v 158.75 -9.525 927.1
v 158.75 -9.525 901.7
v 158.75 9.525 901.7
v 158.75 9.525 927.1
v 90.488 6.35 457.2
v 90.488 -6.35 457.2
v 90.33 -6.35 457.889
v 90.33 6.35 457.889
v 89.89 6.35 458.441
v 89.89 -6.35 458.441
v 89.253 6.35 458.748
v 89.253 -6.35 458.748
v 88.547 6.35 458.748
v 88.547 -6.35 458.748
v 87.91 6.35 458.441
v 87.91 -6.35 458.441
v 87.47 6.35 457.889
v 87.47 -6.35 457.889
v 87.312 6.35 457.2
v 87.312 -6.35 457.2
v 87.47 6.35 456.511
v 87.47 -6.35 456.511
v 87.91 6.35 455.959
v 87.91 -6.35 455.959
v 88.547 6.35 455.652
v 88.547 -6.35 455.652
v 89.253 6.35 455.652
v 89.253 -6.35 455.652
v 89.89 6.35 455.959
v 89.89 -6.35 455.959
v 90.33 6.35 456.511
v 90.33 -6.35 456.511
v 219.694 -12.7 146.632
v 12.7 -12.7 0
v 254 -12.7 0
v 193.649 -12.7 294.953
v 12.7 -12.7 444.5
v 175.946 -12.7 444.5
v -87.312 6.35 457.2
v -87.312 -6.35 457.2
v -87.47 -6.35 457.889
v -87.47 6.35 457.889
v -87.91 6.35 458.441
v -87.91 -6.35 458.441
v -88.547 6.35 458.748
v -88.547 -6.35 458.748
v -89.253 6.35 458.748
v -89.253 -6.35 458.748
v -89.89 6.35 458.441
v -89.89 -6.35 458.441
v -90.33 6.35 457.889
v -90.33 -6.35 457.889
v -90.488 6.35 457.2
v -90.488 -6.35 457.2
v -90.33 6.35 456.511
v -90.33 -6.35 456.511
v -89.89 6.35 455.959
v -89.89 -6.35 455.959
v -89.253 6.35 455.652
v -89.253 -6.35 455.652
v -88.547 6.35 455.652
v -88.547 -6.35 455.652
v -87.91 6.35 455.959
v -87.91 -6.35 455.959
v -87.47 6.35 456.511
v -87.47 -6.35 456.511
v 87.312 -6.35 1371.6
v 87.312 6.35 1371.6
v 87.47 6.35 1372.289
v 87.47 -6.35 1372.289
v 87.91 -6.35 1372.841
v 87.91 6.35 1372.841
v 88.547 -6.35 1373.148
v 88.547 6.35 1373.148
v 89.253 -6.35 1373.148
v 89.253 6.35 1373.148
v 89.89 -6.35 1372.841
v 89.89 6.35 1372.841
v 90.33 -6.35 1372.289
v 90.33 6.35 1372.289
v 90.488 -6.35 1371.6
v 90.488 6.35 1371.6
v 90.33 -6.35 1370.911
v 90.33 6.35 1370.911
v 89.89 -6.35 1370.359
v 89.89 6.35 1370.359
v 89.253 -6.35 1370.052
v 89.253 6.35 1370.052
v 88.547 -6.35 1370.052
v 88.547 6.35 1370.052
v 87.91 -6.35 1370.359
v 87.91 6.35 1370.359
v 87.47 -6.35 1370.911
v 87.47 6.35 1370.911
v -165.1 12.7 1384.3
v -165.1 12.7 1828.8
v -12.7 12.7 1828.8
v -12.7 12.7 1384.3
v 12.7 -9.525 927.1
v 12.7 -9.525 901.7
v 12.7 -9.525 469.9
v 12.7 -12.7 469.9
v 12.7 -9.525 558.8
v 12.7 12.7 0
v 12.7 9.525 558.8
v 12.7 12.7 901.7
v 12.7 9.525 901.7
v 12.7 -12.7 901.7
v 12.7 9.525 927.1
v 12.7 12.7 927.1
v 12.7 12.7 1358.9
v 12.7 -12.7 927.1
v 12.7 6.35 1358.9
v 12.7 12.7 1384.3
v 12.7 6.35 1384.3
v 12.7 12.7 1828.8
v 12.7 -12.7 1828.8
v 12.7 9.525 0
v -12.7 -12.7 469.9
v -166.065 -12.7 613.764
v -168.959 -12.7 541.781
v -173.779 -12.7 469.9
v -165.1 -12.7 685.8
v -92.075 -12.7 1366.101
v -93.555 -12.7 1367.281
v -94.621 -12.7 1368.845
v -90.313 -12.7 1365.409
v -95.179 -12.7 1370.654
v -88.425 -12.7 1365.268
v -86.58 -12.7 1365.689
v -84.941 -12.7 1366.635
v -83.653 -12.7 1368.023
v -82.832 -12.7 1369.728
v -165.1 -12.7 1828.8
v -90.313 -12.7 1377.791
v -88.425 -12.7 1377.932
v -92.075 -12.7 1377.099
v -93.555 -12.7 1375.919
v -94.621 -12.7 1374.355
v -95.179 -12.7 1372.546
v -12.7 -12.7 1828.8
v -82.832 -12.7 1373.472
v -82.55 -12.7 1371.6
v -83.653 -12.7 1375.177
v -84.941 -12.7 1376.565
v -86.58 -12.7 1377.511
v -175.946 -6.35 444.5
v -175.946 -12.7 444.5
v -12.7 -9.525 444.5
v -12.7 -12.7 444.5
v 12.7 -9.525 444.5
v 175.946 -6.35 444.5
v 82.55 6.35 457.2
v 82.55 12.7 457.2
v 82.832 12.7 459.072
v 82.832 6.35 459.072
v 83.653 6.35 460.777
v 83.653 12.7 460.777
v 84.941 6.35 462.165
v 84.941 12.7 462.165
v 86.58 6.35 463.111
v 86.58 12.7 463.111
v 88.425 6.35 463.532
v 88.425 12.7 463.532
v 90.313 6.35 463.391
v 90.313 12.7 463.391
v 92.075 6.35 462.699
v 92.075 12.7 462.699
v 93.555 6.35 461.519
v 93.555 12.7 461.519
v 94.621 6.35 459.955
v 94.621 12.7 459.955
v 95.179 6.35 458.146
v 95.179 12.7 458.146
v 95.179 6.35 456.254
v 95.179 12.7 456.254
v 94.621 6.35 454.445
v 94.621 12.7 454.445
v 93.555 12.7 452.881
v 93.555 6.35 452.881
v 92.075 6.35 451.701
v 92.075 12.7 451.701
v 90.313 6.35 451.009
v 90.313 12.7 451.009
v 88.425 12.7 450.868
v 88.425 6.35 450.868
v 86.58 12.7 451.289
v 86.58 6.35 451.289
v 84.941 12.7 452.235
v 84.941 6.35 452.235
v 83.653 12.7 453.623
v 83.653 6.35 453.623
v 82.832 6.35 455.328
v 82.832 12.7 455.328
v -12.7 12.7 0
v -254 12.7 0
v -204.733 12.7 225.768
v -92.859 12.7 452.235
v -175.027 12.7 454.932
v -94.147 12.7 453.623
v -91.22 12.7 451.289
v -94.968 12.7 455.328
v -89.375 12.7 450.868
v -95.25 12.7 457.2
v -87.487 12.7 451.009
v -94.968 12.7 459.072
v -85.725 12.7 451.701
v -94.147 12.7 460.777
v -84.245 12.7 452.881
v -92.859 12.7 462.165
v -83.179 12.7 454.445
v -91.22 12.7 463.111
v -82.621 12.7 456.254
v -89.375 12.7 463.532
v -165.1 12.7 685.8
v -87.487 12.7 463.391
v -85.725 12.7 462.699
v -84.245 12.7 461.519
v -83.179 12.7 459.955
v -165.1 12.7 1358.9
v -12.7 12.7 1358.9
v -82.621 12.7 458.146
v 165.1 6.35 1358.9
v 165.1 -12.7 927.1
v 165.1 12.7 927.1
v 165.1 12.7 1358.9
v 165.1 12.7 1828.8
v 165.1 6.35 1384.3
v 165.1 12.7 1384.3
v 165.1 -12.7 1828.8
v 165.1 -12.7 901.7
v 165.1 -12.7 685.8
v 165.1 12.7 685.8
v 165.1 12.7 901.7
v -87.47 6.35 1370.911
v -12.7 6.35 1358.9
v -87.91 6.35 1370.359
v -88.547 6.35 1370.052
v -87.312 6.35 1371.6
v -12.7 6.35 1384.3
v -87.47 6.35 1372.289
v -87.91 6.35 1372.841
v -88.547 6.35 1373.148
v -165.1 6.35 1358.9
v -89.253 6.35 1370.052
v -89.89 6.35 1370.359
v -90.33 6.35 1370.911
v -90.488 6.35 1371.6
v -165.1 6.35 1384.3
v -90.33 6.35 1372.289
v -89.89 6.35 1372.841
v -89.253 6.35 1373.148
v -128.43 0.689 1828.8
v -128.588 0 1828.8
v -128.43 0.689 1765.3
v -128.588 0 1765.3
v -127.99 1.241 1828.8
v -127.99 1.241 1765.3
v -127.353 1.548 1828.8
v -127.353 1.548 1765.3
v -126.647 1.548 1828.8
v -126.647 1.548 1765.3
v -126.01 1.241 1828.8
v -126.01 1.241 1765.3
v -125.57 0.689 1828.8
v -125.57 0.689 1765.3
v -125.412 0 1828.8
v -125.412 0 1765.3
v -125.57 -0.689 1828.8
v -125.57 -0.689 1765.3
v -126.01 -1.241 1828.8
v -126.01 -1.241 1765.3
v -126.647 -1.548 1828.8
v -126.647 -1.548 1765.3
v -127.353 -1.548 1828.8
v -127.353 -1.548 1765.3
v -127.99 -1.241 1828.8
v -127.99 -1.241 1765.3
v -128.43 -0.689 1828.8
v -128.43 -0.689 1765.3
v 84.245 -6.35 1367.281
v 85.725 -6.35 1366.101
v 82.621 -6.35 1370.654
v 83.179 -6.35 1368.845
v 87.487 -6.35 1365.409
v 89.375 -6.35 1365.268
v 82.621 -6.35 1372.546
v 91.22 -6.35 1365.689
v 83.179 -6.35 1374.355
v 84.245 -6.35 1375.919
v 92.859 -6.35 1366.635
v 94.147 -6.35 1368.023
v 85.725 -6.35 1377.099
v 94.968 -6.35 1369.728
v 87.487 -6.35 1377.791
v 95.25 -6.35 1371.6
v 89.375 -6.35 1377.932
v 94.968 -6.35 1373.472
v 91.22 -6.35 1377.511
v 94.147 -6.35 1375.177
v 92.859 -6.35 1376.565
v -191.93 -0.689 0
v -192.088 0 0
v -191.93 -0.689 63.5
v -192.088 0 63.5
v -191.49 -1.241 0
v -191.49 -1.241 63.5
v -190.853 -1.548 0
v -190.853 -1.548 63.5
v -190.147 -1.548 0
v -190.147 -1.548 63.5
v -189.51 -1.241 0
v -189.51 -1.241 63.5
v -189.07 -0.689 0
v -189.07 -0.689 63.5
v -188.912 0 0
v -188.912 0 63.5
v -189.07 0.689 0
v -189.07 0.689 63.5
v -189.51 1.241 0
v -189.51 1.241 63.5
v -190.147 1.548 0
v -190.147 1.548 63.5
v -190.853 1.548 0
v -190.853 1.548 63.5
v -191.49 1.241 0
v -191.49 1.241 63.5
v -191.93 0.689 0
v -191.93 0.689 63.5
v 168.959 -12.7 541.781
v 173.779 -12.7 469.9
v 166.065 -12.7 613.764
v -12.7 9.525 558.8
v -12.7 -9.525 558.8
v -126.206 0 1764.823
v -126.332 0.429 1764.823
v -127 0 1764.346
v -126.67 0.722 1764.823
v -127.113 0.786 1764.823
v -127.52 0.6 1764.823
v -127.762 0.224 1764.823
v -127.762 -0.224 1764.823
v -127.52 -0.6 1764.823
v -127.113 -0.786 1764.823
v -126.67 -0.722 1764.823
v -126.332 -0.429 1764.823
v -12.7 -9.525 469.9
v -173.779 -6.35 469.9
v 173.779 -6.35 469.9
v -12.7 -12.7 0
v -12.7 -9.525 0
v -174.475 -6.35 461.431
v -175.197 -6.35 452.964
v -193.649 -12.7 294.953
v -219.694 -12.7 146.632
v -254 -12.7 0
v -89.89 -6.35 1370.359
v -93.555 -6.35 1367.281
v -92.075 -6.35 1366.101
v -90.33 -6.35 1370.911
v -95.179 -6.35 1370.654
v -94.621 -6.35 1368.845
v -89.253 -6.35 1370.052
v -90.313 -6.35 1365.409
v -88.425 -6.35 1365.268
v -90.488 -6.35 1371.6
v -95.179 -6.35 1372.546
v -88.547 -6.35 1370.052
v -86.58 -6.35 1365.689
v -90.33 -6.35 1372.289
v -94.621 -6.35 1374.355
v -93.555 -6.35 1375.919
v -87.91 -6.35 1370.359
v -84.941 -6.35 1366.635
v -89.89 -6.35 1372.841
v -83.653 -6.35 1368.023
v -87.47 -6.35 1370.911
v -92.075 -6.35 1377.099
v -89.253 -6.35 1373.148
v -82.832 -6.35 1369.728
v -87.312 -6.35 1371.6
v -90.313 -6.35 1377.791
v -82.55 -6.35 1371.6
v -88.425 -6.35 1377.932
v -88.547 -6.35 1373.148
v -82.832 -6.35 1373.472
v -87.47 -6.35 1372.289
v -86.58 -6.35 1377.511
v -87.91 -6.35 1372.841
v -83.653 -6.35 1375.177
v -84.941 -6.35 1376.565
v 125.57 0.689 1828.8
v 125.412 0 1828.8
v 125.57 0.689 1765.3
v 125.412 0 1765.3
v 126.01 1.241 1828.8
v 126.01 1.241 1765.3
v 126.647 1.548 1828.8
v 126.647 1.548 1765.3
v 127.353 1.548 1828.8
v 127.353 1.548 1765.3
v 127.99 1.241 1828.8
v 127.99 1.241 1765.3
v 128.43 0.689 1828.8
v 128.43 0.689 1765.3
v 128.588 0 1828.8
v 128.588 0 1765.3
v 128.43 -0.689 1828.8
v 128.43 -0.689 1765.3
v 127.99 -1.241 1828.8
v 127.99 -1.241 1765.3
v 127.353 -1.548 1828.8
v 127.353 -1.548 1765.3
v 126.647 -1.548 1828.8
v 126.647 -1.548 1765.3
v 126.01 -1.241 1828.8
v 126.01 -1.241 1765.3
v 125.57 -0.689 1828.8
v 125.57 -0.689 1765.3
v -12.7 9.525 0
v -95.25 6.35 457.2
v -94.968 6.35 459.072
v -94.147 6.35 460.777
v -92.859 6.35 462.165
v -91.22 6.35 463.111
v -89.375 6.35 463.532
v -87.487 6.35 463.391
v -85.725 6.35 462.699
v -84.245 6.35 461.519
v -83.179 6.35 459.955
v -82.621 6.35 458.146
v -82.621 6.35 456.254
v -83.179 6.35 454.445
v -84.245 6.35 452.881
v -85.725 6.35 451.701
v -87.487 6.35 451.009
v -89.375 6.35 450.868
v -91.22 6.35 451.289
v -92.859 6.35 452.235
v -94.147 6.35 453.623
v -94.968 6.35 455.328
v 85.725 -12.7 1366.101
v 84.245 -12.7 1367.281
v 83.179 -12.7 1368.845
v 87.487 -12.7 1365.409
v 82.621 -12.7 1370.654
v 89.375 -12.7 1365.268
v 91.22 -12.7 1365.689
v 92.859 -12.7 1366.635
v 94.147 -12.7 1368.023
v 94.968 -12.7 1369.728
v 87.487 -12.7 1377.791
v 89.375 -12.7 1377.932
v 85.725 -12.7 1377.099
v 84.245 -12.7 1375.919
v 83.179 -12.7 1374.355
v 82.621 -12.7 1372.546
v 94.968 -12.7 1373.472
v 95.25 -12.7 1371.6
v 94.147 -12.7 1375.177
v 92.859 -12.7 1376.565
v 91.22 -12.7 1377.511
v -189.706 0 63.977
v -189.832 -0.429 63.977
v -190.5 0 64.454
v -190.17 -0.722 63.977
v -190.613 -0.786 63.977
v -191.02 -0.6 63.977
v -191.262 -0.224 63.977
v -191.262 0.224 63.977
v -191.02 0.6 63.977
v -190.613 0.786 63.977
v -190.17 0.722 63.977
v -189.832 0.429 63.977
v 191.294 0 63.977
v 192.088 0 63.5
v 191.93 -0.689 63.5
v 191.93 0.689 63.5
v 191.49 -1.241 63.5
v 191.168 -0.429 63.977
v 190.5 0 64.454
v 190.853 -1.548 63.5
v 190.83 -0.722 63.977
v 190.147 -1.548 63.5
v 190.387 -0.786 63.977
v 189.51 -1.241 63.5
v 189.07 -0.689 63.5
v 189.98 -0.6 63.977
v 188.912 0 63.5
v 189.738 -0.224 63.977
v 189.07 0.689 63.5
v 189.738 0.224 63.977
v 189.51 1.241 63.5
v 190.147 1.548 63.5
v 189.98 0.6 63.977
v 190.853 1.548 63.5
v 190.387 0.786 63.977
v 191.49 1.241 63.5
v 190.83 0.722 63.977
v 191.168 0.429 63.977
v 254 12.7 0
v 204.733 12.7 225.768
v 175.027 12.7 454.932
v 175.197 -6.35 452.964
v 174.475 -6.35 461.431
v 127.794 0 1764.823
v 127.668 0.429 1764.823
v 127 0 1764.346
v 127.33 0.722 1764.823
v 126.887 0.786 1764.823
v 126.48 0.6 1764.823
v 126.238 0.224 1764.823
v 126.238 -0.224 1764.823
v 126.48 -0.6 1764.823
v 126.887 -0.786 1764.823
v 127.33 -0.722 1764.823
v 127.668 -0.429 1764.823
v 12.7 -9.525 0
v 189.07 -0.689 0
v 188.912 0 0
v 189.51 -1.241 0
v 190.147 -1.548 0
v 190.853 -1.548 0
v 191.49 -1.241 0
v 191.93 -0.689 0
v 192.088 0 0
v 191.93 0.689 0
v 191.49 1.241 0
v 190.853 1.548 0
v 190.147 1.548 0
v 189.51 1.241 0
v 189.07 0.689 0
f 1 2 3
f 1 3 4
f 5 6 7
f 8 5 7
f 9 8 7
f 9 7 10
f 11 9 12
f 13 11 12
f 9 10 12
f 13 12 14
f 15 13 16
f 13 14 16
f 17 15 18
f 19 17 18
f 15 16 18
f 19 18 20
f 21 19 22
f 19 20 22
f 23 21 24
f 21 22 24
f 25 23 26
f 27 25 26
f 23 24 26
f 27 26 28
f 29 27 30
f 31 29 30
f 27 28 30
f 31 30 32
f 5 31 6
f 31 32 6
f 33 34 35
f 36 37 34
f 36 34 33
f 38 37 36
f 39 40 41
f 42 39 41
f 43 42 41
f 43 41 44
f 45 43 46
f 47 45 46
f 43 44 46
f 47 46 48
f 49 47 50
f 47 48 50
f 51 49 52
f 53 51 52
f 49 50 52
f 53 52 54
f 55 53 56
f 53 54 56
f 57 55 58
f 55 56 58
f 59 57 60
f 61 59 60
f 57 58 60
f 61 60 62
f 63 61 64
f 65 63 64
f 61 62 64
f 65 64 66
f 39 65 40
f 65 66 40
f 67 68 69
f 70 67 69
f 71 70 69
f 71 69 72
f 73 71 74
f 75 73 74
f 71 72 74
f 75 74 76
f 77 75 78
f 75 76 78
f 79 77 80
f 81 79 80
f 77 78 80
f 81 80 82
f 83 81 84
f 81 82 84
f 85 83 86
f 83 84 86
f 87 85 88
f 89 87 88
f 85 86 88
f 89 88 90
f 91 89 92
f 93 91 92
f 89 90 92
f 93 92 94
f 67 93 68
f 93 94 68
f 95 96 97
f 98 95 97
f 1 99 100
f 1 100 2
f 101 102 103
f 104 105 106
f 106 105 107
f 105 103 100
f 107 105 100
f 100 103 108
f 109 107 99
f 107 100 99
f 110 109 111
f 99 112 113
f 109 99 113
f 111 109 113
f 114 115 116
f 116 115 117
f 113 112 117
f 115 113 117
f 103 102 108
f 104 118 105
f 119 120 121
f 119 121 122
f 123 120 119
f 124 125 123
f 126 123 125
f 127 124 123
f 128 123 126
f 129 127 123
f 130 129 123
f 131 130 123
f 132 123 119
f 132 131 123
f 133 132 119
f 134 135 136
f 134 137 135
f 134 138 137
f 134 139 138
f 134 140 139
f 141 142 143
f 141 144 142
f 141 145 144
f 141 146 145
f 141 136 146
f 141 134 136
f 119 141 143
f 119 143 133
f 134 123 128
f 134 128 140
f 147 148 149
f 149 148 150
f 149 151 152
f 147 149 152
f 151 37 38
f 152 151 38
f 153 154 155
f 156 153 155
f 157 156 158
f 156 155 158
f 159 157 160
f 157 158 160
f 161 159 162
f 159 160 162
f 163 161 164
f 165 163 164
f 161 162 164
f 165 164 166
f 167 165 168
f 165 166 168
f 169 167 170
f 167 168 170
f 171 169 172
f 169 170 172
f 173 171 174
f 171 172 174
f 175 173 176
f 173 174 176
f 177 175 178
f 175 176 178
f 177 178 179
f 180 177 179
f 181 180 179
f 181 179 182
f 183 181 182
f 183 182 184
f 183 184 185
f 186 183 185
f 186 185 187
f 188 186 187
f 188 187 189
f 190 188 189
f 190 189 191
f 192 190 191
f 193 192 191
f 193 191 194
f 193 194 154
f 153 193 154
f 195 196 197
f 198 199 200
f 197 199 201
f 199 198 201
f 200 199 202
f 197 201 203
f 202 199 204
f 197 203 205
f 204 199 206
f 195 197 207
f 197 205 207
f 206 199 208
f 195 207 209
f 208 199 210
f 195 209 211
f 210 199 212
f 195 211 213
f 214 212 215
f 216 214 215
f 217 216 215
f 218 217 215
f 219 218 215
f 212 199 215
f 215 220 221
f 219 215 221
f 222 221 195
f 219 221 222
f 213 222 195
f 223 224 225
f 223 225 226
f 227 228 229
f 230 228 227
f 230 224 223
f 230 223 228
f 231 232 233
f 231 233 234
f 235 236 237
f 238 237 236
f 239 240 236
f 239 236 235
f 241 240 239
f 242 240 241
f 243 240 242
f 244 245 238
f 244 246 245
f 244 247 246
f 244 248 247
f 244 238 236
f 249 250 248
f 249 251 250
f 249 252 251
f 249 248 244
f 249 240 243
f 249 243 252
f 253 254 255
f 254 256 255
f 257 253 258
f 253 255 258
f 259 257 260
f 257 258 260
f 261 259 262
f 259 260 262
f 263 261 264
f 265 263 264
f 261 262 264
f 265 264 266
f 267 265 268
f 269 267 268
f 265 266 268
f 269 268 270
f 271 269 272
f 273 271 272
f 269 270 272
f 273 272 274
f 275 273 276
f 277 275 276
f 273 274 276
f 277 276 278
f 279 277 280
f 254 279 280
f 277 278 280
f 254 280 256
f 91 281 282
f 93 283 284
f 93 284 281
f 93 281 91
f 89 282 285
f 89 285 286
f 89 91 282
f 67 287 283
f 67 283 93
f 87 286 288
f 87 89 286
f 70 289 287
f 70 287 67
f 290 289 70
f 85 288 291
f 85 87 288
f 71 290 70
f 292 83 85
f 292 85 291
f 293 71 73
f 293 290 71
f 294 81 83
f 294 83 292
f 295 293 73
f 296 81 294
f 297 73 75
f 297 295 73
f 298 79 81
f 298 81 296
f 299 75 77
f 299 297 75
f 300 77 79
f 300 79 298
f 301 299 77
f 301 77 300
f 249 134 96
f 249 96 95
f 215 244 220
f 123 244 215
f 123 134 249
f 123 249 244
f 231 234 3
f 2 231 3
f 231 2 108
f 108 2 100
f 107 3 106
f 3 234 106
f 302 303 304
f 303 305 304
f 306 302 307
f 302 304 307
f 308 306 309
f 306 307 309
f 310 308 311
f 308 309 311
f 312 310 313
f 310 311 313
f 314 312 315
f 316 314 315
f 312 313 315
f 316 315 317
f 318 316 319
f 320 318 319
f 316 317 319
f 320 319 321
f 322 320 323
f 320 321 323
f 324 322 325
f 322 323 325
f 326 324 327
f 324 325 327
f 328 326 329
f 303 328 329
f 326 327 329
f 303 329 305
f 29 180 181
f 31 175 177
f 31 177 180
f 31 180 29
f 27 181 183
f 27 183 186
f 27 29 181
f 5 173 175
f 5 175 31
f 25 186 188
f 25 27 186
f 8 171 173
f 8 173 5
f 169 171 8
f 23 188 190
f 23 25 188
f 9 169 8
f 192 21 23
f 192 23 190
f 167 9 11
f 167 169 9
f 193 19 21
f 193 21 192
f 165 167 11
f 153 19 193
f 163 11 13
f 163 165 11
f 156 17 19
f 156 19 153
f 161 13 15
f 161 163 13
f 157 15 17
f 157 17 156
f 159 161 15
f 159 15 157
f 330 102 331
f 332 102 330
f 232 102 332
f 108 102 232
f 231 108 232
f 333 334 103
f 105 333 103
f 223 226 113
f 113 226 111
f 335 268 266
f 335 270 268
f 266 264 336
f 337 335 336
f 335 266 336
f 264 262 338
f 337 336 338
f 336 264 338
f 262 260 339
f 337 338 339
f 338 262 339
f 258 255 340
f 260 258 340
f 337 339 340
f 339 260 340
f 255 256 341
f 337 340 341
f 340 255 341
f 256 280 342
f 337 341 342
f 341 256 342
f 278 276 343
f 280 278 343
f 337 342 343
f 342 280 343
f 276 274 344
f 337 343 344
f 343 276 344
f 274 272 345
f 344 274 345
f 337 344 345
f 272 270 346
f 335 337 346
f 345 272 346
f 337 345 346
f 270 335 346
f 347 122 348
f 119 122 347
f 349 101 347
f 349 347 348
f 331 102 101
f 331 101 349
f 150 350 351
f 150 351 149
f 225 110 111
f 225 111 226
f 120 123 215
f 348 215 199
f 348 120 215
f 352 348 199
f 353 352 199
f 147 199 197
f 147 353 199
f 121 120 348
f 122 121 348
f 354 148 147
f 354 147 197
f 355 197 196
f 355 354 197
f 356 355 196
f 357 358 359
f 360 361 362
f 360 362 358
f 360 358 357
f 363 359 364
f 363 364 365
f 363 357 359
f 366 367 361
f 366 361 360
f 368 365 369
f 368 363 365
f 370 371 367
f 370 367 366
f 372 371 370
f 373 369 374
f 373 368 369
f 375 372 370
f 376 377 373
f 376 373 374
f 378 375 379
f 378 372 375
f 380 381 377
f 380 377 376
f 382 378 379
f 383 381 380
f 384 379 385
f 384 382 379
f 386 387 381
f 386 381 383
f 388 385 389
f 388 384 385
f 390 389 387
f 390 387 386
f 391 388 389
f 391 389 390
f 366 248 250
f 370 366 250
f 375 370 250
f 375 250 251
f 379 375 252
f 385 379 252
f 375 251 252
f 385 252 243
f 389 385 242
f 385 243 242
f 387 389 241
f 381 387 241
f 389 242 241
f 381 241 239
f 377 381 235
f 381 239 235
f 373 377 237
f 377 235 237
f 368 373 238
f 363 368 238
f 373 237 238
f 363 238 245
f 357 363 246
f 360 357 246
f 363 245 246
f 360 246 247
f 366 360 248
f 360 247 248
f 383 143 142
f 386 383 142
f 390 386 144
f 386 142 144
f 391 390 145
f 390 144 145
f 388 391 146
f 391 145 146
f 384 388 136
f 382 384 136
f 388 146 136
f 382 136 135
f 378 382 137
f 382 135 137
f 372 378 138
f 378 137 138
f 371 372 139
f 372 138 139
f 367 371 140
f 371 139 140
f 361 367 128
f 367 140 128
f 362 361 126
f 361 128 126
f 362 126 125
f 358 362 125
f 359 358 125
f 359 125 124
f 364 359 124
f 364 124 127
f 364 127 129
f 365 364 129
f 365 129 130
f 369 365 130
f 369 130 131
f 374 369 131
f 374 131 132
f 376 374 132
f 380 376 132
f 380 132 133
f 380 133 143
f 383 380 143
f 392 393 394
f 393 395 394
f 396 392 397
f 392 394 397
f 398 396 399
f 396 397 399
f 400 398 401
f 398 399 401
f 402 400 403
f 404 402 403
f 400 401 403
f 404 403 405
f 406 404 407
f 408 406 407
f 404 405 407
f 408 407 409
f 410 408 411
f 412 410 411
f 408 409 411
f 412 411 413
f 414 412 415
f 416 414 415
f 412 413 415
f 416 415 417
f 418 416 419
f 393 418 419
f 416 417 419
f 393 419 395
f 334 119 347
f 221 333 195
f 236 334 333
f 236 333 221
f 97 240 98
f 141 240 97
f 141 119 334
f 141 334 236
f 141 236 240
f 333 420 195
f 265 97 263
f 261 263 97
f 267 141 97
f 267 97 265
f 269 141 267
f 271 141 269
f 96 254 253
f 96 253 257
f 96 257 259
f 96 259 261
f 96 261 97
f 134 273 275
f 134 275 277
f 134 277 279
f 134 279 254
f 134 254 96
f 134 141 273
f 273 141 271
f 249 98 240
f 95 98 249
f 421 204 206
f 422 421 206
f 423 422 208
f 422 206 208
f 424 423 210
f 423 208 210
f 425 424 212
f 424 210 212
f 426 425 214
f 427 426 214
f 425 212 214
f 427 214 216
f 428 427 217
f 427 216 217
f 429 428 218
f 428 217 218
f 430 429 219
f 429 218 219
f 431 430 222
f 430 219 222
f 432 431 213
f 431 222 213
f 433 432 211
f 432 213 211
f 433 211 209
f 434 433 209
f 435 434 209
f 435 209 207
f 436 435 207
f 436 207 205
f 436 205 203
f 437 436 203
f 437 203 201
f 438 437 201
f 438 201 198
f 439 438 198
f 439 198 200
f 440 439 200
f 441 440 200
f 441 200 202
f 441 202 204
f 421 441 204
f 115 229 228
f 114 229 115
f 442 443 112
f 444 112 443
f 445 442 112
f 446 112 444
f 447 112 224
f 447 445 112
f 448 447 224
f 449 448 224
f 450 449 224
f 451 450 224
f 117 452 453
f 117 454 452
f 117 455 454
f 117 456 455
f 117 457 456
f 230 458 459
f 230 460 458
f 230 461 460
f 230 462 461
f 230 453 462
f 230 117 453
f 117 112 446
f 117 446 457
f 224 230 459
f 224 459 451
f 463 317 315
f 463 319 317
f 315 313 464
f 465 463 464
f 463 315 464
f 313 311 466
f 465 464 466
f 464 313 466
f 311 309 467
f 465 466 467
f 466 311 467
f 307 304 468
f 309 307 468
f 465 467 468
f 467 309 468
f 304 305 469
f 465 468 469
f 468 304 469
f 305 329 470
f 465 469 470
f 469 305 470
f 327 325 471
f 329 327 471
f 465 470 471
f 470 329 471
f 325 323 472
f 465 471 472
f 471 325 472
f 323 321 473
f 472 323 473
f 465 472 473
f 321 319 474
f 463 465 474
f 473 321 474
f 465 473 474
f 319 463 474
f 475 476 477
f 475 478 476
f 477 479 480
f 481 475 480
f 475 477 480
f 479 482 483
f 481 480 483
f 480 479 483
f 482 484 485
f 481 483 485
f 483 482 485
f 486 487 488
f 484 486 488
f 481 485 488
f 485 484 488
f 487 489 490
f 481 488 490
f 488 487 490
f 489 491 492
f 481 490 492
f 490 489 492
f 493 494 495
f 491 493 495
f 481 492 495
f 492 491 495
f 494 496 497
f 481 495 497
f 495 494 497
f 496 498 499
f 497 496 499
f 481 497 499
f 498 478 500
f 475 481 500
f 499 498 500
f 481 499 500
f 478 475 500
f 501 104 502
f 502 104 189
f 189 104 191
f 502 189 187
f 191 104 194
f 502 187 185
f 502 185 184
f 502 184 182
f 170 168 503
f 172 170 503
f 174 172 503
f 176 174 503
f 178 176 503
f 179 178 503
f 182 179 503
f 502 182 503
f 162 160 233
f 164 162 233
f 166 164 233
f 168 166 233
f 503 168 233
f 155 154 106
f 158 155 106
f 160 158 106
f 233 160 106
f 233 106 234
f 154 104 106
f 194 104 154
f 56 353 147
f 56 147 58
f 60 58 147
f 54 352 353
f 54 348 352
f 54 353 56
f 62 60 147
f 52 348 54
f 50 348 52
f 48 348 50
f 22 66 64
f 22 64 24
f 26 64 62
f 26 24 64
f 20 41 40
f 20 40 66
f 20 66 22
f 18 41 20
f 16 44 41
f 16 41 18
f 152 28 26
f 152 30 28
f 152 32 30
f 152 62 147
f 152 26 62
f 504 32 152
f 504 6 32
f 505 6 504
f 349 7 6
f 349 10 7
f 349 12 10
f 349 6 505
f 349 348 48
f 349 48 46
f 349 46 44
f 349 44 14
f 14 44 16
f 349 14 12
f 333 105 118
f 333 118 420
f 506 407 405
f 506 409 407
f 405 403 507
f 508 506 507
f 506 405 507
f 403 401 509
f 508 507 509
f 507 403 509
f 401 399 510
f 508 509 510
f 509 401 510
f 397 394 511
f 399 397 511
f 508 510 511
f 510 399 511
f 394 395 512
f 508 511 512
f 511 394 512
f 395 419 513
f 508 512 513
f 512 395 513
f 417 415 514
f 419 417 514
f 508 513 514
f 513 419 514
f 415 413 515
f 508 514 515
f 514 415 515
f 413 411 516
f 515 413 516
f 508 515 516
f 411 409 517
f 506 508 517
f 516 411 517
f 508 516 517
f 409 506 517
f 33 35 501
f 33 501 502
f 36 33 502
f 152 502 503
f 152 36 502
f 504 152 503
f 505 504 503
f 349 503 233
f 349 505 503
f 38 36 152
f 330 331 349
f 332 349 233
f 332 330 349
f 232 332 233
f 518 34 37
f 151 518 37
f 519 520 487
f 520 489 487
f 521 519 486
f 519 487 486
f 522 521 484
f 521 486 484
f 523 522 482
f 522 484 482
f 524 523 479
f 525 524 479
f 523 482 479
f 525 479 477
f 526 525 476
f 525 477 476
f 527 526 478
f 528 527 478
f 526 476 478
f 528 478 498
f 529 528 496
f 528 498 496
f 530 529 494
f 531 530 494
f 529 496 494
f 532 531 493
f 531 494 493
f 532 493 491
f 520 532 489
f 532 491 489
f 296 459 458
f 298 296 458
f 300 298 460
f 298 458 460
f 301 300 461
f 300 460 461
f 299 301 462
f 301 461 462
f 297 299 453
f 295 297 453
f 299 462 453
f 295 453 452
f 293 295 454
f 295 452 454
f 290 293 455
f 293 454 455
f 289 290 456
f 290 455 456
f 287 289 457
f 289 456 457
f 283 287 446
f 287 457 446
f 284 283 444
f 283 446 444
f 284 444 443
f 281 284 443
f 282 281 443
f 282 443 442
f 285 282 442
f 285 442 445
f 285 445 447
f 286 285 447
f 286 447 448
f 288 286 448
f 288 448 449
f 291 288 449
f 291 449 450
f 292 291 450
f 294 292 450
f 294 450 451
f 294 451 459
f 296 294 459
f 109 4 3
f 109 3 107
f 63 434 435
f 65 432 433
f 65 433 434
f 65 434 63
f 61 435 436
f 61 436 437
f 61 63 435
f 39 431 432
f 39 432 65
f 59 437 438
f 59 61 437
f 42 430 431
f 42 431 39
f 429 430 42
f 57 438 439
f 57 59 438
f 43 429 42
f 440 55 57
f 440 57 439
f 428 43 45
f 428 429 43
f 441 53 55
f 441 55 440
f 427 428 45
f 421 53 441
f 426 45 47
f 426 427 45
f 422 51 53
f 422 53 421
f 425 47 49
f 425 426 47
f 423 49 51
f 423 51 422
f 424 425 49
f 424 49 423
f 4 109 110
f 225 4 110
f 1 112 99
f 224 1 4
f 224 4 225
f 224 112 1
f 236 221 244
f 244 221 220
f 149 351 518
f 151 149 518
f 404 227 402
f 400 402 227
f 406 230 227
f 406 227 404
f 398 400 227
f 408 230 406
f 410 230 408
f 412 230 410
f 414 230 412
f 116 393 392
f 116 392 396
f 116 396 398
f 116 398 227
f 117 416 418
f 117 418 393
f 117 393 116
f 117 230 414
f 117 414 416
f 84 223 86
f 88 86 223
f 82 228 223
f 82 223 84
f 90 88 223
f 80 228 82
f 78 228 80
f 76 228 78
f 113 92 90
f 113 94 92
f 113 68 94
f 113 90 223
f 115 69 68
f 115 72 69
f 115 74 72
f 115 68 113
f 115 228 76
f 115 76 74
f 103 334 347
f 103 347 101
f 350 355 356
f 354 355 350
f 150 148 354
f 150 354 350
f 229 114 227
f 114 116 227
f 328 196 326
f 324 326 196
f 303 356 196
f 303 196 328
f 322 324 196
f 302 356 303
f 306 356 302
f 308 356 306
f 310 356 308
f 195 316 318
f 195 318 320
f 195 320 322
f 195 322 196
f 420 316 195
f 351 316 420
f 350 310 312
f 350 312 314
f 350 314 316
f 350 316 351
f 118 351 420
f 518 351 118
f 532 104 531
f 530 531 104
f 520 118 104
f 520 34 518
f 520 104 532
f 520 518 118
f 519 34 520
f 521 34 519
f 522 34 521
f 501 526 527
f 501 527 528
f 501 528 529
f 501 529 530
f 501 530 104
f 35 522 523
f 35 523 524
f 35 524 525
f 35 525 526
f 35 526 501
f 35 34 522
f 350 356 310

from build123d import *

# Parameters (mm, degrees)
F1_DEPTH       = 12.7
F25_DEPTH      = 38.1
F3_D           = 3.175
F3_DEPTH       = 63.5
F3_CBORE_D     = 12.7
F3_CBORE_DEPTH = 6.35
F3_TIP         = 0.9538662327
F5_D           = 3.175
F5_DEPTH       = 63.5
F5_CBORE_D     = 12.7
F5_CBORE_DEPTH = 6.35
F5_TIP         = 0.9538662327
F7_D           = 3.175
F7_DEPTH       = 63.5
F7_TIP         = 0.9538662327
F9_D           = 3.175
F9_DEPTH       = 63.5
F9_TIP         = 0.9538662327
F10_W          = 330.2
F10_H          = 25.4
F11_DEPTH      = 6.35
F12_W          = 426.9362986088
F12_H          = 25.4
F13_DEPTH      = 6.35
F14_W          = 25.4
F14_H          = 558.8
F15_DEPTH      = 3.175
F16_W          = 25.4
F16_H          = 558.8
F17_DEPTH      = 3.175
F19_W          = 12.7
F19_H          = 25.4
F20_DEPTH      = 25.4
F18_W          = 165.1
F18_H          = 25.4
F21_DEPTH      = 3.175
F22_W          = 165.1
F22_H          = 25.4
F23_DEPTH      = 3.175


with BuildPart() as f1:
    # F0 (on Front) → F1 (new body, symmetric)
    with BuildSketch(Plane.XZ):
        with BuildLine():
            Line((165.1, 1828.8), (0, 1828.8))
            Line((0, 1828.8), (-165.1, 1828.8))
            Line((-165.1, 1828.8), (-165.1, 685.8))
            ThreePointArc((-165.1, 685.8), (-187.4175900274, 340.0309838924), (-254, 0))
            Line((-254, 0), (0, 0))
            Line((0, 0), (254, 0))
            ThreePointArc((254, 0), (187.4175900273, 340.0309838924), (165.1, 685.8))
            Line((165.1, 685.8), (165.1, 1828.8))
        make_face()
    extrude(amount=F1_DEPTH, both=True)

    # F24 (on face) → F25 (cut)
    with BuildSketch(Plane.XZ.offset(12.7)):
        Polygon((-12.7, 558.8), (0, 558.8), (12.7, 558.8), (12.7, 1828.8), (0, 1828.8), (-12.7, 1828.8), align=None)
    extrude(amount=-F25_DEPTH, mode=Mode.SUBTRACT)

    # F3
    with Locations(Plane.XZ.offset(12.7)):
        with Locations((-88.9, 1371.6), (88.9, 1371.6)):
            CounterBoreHole(F3_D / 2, F3_CBORE_D / 2, F3_CBORE_DEPTH, depth=F3_DEPTH)
            with Locations((0, 0, -(F3_DEPTH + F3_TIP / 2))):  # 118° drill point
                Cone(0, F3_D / 2, F3_TIP, mode=Mode.SUBTRACT)

    # F5
    with Locations(Plane(origin=(0, 12.7, 0), x_dir=(-1, 0, 0), z_dir=(0, 1, 0))):
        with Locations((-88.9, 457.2), (88.9, 457.2)):
            CounterBoreHole(F5_D / 2, F5_CBORE_D / 2, F5_CBORE_DEPTH, depth=F5_DEPTH)
            with Locations((0, 0, -(F5_DEPTH + F5_TIP / 2))):  # 118° drill point
                Cone(0, F5_D / 2, F5_TIP, mode=Mode.SUBTRACT)

    # F7
    with Locations(Plane.XY.offset(1828.8)):
        with Locations((-127, 0), (127, 0)):
            Hole(F7_D / 2, depth=F7_DEPTH)
            with Locations((0, 0, -(F7_DEPTH + F7_TIP / 2))):  # 118° drill point
                Cone(0, F7_D / 2, F7_TIP, mode=Mode.SUBTRACT)

    # F9
    with Locations(Plane(origin=(0, 0, 0), x_dir=(1, 0, 0), z_dir=(0, 0, -1))):
        with Locations((-190.5, 0), (190.5, 0)):
            Hole(F9_D / 2, depth=F9_DEPTH)
            with Locations((0, 0, -(F9_DEPTH + F9_TIP / 2))):  # 118° drill point
                Cone(0, F9_D / 2, F9_TIP, mode=Mode.SUBTRACT)

    # F10 (on face) → F11 (cut)
    with BuildSketch(Plane(origin=(0, 12.7, 0), x_dir=(-1, 0, 0), z_dir=(0, 1, 0))):
        with Locations((0, 1371.6)):
            Rectangle(F10_W, F10_H)
    extrude(amount=-F11_DEPTH, mode=Mode.SUBTRACT)

    # F12 (on face) → F13 (cut)
    with BuildSketch(Plane.XZ.offset(12.7)):
        with Locations((0, 457.2)):
            Rectangle(F12_W, F12_H)
    extrude(amount=-F13_DEPTH, mode=Mode.SUBTRACT)

    # F14 (on face) → F15 (cut)
    with BuildSketch(Plane(origin=(0, 12.7, 0), x_dir=(-1, 0, 0), z_dir=(0, 1, 0))):
        with Locations((0, 279.4)):
            Rectangle(F14_W, F14_H)
    extrude(amount=-F15_DEPTH, mode=Mode.SUBTRACT)

    # F16 (on face) → F17 (cut)
    with BuildSketch(Plane.XZ.offset(12.7)):
        with Locations((0, 279.4)):
            Rectangle(F16_W, F16_H)
    extrude(amount=-F17_DEPTH, mode=Mode.SUBTRACT)

    # F19 (on face) → F20 (cut)
    with BuildSketch(Plane.XZ.offset(12.7)):
        with Locations((165.1, 914.4)):
            Rectangle(F19_W, F19_H)
    extrude(amount=-F20_DEPTH, mode=Mode.SUBTRACT)

    # F18 (on face) → F21 (cut)
    with BuildSketch(Plane.XZ.offset(12.7)):
        with Locations((82.55, 914.4)):
            Rectangle(F18_W, F18_H)
    extrude(amount=-F21_DEPTH, mode=Mode.SUBTRACT)

    # F22 (on face) → F23 (cut)
    with BuildSketch(Plane(origin=(0, 12.7, 0), x_dir=(-1, 0, 0), z_dir=(0, 1, 0))):
        with Locations((-82.55, 914.4)):
            Rectangle(F22_W, F22_H)
    extrude(amount=-F23_DEPTH, mode=Mode.SUBTRACT)


solid = f1.part
